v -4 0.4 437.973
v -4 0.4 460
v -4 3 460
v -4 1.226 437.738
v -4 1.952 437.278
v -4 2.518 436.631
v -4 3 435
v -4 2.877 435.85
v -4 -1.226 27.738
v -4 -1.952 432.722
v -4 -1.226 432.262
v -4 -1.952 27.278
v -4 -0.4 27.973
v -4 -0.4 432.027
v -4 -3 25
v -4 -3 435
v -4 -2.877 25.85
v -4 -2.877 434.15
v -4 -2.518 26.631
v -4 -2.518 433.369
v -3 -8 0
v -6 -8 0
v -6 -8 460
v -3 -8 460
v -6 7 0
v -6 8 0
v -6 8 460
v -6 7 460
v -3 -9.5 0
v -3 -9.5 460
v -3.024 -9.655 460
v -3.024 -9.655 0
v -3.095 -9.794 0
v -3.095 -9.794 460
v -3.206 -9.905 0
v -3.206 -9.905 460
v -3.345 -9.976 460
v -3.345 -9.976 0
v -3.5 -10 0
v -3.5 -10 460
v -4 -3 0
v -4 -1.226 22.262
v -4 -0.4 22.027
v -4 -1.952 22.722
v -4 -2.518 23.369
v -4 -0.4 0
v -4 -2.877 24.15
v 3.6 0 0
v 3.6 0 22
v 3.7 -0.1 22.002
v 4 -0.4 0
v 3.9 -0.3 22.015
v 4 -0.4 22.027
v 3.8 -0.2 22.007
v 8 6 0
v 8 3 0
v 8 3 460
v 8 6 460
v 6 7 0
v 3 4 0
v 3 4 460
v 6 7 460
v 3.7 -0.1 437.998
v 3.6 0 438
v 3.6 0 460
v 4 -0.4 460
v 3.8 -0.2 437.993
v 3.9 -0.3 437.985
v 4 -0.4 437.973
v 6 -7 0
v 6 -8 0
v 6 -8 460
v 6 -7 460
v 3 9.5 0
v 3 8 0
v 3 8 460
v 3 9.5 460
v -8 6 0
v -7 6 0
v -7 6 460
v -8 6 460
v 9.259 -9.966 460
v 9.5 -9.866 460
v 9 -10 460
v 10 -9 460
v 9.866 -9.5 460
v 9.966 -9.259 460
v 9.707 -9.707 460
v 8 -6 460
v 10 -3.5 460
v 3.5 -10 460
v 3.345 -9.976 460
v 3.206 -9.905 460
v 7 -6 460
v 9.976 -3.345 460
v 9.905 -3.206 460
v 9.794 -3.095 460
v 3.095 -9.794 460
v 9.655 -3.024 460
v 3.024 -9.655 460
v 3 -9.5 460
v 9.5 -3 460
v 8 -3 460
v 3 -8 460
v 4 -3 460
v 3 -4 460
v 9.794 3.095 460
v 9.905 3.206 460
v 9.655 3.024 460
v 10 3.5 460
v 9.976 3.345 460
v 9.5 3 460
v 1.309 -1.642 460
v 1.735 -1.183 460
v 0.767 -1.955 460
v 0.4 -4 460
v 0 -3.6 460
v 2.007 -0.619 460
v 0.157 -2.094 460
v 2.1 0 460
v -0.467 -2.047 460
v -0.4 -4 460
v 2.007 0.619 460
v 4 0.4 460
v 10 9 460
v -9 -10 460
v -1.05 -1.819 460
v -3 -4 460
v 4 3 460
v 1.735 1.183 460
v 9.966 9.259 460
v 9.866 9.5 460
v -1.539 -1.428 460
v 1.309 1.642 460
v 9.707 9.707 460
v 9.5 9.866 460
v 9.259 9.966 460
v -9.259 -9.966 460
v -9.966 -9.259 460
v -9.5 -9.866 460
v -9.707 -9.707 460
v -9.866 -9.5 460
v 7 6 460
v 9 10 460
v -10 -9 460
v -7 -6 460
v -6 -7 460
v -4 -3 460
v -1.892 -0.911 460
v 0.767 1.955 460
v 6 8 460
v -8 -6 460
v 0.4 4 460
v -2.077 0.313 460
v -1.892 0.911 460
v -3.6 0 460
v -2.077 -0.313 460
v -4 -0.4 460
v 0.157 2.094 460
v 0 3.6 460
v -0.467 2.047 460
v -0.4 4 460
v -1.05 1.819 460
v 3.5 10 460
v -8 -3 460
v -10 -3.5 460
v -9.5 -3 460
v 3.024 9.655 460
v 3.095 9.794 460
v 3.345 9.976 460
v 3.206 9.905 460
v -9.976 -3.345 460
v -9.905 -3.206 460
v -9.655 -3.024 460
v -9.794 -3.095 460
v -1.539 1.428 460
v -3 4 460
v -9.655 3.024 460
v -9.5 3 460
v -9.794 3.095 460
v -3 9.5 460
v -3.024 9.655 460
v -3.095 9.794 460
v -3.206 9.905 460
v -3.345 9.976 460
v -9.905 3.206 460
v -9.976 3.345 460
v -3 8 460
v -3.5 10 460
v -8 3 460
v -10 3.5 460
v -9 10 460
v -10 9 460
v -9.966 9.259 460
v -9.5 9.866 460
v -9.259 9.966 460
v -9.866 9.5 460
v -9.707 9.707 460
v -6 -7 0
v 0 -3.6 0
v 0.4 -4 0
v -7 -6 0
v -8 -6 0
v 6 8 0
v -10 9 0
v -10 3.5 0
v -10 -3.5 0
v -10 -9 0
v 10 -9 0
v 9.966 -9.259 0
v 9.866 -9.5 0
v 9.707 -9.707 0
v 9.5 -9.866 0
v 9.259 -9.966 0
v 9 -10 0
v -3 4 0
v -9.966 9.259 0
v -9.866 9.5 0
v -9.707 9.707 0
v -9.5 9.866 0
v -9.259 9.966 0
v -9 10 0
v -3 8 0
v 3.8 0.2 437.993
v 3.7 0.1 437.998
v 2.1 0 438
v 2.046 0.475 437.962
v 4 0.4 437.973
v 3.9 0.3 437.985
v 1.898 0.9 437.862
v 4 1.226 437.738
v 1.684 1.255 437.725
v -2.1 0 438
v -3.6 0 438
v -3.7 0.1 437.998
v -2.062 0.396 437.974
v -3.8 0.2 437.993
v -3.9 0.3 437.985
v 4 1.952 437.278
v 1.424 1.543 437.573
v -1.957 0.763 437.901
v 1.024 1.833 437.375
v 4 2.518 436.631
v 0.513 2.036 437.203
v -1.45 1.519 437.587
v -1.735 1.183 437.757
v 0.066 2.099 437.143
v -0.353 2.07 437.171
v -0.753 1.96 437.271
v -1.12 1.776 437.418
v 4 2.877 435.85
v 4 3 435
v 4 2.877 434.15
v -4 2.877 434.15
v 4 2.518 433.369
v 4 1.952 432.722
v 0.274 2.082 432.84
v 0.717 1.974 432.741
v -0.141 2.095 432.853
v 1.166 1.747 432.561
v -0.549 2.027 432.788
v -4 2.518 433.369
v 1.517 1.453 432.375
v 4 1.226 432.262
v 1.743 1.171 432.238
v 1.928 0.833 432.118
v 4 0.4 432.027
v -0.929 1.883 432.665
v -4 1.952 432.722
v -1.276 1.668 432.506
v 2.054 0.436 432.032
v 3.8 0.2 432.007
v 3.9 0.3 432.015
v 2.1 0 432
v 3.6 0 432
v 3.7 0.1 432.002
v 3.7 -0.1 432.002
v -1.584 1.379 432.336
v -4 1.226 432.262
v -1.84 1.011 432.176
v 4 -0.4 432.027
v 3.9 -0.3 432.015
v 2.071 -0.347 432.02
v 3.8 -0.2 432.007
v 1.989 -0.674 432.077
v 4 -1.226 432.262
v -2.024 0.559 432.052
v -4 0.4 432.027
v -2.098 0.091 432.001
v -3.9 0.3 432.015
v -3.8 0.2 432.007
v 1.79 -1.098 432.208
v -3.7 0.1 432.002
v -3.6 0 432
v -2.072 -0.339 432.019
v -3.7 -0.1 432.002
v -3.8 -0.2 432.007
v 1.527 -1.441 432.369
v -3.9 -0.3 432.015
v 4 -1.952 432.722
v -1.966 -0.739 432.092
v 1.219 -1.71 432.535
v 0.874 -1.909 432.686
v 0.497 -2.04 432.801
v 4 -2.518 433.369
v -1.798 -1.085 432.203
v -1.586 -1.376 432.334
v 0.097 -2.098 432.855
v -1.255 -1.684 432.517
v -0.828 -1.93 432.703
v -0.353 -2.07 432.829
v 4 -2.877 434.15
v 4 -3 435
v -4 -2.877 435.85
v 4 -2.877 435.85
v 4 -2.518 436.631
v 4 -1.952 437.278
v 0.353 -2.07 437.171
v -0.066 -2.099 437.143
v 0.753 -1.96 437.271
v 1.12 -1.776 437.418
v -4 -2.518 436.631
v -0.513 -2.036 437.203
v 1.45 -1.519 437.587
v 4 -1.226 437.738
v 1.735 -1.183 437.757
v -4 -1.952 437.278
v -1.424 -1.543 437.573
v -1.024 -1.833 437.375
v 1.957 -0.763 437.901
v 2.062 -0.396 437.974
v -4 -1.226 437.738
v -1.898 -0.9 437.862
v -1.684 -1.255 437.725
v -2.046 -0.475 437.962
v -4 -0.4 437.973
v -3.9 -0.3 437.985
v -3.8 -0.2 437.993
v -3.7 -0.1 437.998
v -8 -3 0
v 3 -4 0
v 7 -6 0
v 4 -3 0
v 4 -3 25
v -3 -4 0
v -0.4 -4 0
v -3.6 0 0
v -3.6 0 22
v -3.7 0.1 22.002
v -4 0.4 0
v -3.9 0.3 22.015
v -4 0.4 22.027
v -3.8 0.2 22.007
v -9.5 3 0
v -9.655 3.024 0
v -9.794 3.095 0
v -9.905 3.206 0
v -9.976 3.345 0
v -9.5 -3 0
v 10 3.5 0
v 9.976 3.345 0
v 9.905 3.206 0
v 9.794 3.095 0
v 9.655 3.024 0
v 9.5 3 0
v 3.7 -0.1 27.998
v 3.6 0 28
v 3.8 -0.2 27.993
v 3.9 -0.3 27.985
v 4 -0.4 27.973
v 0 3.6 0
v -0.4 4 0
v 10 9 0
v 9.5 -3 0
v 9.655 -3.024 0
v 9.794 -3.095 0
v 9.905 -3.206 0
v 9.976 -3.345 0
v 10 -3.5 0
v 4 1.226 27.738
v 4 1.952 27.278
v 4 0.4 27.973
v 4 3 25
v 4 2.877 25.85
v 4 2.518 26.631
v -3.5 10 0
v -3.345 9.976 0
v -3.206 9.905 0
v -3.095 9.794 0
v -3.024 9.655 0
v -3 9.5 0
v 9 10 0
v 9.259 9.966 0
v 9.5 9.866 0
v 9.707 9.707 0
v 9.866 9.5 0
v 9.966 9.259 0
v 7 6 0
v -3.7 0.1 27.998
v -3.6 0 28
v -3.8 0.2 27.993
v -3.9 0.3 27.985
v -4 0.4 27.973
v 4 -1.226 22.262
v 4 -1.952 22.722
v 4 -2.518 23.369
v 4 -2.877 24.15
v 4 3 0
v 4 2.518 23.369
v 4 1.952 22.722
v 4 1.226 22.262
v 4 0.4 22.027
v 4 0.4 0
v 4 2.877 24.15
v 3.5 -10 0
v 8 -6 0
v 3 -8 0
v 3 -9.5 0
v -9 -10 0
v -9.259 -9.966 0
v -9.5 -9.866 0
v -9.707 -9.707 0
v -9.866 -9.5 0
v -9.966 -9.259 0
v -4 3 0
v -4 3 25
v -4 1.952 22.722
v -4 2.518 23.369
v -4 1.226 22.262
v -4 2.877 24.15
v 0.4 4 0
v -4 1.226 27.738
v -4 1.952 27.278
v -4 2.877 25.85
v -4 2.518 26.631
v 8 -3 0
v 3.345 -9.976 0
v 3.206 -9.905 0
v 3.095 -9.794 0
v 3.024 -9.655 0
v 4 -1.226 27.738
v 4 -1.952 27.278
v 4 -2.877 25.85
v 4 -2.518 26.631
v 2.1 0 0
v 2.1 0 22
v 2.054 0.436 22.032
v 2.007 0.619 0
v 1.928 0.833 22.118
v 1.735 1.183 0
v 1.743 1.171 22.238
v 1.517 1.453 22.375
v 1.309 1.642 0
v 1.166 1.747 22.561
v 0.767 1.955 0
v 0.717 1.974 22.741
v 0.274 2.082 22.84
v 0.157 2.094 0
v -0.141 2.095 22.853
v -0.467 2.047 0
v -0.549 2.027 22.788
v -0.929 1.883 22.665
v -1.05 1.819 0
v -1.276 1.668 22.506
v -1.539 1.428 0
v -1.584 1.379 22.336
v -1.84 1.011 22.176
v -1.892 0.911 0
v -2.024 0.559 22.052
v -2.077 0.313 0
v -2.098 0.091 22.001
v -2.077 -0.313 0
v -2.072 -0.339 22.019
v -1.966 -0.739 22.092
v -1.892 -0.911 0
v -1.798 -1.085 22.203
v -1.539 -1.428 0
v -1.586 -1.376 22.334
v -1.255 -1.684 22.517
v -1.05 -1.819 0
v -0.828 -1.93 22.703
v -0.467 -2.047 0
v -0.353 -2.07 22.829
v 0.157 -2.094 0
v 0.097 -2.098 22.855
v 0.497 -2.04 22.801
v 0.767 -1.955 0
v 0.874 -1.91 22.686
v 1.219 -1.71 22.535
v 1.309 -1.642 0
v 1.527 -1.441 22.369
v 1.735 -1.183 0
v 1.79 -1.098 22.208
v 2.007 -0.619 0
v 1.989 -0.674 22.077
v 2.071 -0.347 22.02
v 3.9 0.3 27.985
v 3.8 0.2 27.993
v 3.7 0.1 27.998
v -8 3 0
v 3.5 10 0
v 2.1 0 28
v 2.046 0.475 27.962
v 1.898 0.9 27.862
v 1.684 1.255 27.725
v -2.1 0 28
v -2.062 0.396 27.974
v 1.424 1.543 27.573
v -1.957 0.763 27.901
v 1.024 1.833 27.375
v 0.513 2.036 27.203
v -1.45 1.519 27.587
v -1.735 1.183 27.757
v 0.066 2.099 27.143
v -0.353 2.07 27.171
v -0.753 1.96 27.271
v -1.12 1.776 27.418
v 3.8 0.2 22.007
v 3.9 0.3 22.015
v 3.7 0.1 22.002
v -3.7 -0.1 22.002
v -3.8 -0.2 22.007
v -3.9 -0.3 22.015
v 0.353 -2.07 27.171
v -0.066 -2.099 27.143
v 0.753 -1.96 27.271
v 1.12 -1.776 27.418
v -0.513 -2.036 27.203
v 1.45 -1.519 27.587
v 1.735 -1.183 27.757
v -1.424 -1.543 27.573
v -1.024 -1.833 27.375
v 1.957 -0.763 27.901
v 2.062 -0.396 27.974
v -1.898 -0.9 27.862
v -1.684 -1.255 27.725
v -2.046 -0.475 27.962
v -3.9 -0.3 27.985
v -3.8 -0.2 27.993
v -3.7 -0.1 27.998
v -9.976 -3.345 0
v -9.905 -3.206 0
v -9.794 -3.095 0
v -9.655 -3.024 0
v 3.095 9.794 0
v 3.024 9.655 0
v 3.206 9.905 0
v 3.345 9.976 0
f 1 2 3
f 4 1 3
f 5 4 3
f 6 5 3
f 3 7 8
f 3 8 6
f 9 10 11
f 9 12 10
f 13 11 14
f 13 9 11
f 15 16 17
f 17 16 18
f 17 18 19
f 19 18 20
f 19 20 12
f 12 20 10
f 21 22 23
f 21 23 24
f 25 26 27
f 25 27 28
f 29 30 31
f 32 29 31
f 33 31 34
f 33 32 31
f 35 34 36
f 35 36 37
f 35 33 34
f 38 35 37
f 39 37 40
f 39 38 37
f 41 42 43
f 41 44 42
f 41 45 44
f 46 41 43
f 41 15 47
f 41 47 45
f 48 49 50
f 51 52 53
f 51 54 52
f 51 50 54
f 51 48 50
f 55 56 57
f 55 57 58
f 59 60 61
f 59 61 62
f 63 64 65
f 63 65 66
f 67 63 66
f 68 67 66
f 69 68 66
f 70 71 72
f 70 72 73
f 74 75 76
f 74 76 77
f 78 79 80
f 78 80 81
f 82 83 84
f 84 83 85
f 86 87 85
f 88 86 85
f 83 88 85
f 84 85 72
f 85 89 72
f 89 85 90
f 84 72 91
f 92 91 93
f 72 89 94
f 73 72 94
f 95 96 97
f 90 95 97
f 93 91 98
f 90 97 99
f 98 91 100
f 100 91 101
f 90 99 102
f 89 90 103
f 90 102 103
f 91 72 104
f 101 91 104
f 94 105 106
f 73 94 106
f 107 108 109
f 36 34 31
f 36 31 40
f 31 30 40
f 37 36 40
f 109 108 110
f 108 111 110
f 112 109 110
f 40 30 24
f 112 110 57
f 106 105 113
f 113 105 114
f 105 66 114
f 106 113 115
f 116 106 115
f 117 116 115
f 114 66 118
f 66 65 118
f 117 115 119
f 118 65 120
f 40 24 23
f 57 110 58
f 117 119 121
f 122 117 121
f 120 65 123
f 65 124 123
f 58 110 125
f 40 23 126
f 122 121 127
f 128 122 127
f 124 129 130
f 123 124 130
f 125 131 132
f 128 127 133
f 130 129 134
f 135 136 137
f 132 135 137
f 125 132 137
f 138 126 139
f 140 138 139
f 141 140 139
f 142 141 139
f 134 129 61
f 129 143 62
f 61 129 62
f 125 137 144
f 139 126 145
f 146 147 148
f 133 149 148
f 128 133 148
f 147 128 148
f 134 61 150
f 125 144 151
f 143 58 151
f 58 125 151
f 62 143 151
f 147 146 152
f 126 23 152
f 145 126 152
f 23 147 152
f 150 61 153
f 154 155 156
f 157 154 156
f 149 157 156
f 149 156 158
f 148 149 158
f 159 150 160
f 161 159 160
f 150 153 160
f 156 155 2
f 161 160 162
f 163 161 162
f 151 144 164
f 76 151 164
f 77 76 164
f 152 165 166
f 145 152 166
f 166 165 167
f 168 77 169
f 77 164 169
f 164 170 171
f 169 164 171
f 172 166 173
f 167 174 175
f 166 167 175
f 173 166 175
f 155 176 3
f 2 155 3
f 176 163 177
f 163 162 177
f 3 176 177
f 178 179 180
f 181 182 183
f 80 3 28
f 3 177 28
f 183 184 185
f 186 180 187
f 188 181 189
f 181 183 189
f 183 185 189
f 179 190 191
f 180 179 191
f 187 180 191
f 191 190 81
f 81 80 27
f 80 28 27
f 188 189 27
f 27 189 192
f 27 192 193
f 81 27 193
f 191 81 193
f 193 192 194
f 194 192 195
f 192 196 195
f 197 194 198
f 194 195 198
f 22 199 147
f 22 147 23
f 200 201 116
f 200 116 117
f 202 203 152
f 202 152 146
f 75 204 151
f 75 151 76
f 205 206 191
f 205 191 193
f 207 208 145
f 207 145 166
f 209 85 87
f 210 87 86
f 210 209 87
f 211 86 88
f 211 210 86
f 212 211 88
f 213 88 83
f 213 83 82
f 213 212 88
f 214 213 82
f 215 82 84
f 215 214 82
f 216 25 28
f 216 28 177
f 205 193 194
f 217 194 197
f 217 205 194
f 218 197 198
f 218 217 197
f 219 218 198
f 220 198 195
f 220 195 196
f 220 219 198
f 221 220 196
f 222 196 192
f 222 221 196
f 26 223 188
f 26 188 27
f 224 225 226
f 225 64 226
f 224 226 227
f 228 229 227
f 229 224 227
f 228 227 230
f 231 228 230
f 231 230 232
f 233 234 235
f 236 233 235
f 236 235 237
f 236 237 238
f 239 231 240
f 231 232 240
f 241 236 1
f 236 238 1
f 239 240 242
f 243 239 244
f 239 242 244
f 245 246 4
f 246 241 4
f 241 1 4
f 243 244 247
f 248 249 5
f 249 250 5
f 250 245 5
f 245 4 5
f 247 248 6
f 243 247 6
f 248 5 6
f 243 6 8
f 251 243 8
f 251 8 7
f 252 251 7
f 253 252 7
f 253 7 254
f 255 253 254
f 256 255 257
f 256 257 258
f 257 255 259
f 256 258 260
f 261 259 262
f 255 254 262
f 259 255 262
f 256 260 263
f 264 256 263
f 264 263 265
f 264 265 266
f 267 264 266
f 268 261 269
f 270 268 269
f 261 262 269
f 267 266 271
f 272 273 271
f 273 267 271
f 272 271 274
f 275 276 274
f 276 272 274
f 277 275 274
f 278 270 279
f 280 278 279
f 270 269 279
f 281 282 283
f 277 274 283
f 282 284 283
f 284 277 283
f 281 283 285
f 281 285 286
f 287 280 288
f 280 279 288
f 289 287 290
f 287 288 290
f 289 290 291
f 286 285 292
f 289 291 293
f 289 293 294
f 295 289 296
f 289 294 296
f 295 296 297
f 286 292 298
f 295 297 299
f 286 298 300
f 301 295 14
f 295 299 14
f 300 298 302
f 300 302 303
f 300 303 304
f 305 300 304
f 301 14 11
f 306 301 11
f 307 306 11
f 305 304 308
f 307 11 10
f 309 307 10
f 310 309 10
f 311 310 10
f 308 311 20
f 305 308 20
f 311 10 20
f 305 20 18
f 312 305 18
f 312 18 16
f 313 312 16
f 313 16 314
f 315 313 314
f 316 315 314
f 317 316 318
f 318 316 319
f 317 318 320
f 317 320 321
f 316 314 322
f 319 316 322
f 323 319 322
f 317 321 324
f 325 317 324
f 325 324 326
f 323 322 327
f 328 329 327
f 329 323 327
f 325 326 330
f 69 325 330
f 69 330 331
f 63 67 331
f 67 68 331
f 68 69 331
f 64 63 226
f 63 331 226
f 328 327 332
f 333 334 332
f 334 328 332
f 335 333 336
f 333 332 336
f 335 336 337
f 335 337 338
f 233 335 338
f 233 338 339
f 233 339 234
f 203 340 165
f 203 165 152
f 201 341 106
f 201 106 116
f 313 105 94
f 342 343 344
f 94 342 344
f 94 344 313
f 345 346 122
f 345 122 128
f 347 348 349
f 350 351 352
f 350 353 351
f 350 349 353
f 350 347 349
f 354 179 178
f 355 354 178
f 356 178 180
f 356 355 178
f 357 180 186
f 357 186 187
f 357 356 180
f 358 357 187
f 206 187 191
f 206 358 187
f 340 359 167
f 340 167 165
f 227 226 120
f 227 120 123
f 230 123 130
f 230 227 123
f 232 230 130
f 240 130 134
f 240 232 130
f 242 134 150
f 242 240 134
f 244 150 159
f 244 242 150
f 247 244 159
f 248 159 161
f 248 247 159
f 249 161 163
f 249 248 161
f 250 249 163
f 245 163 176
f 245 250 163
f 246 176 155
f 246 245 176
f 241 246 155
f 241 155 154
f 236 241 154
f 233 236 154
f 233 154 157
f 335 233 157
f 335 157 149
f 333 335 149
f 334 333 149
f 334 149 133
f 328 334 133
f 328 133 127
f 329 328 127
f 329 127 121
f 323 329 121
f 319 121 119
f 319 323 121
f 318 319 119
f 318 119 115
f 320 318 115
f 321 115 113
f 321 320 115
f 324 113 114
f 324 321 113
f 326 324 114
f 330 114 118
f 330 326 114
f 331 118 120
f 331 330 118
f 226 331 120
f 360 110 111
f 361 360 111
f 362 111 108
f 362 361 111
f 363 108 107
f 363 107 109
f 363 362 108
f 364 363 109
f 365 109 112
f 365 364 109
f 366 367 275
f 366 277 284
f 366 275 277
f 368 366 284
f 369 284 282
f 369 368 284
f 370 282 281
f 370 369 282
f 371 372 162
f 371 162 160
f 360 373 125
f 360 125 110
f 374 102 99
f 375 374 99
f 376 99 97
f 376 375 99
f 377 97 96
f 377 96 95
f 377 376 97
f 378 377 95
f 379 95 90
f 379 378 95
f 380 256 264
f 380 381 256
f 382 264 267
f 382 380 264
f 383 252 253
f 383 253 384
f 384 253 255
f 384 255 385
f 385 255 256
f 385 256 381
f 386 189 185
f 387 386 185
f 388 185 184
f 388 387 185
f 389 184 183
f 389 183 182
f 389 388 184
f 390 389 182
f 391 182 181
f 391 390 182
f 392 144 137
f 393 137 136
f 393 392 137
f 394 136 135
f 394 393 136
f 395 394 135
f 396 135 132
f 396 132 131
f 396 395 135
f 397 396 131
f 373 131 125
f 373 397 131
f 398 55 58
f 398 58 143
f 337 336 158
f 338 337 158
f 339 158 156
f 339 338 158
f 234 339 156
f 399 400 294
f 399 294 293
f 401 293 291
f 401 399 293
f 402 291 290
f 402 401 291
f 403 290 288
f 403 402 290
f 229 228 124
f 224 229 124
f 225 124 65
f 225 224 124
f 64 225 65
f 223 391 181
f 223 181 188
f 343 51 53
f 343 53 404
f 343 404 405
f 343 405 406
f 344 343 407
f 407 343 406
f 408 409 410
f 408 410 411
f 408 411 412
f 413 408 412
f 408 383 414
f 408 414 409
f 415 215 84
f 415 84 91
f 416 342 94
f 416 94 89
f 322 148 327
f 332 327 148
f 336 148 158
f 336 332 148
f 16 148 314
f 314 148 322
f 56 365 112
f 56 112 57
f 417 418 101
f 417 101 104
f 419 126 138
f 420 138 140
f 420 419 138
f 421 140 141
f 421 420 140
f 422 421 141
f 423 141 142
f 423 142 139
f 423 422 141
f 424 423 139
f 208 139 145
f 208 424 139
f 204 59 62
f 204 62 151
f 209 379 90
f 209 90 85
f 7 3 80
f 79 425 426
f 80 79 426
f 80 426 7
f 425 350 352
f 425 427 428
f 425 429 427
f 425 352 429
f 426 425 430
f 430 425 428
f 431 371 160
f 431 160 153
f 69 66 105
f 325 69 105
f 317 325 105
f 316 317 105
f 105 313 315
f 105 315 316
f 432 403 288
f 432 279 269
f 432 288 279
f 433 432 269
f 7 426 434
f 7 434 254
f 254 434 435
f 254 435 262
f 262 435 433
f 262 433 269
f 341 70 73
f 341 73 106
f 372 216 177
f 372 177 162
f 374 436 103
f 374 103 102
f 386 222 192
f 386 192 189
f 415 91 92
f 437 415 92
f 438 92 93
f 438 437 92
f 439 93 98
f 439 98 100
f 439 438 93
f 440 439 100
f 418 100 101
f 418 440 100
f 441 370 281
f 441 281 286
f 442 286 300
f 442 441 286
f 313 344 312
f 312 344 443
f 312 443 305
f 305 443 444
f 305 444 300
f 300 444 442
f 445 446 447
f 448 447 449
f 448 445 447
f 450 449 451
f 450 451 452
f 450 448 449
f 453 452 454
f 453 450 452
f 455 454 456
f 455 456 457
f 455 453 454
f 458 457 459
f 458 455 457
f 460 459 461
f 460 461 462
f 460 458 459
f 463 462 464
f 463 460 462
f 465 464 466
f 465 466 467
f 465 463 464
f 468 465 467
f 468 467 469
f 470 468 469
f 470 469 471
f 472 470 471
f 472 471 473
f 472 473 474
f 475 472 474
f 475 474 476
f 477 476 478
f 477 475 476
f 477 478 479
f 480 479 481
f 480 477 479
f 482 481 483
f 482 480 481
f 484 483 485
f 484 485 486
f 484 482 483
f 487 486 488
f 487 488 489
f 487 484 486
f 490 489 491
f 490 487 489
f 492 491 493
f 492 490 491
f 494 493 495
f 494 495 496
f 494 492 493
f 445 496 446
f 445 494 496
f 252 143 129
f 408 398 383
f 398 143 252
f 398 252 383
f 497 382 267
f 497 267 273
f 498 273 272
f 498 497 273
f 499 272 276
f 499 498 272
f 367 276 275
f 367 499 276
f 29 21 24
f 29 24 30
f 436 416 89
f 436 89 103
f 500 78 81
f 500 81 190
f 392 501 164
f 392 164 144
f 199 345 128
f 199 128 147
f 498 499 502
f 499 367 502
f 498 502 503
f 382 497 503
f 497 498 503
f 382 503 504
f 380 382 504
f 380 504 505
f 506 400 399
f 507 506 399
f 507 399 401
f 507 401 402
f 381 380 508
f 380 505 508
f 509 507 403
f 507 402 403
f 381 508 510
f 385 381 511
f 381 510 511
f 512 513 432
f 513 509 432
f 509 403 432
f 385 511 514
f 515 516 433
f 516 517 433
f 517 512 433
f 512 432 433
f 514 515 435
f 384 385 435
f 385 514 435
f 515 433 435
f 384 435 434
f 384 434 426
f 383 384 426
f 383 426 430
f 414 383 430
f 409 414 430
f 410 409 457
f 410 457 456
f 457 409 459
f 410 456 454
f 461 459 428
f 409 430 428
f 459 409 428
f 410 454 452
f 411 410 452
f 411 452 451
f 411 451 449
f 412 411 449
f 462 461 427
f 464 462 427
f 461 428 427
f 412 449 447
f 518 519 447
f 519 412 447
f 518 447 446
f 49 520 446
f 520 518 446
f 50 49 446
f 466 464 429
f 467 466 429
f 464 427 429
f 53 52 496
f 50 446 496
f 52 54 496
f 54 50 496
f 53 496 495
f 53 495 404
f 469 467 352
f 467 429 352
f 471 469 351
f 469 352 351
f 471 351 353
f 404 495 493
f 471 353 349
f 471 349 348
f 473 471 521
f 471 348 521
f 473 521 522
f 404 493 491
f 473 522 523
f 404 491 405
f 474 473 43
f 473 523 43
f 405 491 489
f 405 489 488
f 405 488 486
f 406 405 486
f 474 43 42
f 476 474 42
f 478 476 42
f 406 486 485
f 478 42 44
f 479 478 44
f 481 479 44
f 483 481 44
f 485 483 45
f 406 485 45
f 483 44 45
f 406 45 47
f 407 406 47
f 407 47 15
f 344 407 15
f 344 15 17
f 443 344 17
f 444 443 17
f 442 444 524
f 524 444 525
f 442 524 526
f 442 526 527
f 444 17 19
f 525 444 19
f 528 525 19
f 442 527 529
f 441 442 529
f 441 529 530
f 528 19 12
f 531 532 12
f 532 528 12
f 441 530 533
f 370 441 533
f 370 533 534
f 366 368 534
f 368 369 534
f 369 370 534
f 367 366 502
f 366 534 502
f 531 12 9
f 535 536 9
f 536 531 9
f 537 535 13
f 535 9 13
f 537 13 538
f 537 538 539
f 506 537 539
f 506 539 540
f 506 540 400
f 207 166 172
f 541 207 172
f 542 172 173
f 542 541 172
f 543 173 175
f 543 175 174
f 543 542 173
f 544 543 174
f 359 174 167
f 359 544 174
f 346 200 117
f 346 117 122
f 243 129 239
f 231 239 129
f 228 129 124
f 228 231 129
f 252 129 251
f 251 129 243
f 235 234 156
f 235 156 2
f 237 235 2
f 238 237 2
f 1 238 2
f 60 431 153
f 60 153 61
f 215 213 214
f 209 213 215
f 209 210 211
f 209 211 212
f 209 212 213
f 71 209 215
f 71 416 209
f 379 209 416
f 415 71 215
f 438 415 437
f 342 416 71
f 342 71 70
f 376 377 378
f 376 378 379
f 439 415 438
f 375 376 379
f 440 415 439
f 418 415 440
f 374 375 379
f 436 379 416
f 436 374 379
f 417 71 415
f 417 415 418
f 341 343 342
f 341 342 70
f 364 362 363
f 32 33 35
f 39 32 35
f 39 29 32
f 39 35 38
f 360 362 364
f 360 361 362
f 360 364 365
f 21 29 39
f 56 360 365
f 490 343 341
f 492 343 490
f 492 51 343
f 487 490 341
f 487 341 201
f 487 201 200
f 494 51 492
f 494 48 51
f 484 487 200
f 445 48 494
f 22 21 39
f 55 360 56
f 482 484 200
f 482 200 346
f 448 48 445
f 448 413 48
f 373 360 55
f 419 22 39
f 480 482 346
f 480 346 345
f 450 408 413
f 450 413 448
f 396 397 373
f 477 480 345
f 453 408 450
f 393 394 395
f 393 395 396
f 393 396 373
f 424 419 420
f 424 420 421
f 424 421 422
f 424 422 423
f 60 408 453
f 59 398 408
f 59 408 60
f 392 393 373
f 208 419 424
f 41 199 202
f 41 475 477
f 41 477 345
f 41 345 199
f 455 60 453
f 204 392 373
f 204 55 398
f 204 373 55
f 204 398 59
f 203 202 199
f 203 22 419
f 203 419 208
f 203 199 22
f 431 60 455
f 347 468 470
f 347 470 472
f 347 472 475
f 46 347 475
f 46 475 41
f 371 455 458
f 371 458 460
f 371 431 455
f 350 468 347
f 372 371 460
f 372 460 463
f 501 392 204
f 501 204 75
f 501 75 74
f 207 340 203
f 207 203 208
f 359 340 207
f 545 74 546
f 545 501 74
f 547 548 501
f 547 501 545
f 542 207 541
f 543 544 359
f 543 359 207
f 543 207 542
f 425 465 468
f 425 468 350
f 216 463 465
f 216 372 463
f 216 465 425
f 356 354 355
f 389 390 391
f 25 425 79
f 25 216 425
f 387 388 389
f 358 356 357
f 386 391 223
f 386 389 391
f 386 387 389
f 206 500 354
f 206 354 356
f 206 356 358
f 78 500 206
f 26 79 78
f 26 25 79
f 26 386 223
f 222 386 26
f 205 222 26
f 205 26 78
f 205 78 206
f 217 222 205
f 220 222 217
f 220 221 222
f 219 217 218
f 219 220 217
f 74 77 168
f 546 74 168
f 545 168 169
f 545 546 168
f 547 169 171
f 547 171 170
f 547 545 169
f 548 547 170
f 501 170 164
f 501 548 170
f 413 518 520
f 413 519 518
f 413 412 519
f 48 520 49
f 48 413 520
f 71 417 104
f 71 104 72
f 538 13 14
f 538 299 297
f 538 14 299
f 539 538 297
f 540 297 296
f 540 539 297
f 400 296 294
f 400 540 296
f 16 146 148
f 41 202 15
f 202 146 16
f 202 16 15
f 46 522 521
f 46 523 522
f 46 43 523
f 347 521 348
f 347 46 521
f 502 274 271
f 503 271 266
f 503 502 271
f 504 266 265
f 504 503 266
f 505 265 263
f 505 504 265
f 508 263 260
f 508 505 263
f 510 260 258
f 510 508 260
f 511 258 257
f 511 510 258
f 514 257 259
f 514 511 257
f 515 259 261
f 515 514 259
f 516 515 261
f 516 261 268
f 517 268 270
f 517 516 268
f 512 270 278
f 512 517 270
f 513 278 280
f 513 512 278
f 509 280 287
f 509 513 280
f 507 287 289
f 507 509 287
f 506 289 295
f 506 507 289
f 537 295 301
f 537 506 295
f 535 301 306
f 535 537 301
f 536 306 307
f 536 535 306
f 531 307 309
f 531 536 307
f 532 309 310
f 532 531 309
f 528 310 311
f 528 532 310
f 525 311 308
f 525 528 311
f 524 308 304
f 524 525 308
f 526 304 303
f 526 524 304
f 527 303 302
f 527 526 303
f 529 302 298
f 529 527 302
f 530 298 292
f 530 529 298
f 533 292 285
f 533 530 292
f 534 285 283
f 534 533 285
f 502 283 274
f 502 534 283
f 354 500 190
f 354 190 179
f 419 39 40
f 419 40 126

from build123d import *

# Parameters (mm, degrees)
SCHIZZO1_R                   = 2.1
ESTRUSIONE_ESTRUSIONE1_DEPTH = 460
SCHIZZO2_R                   = 3
TAGLIO_ESTRUSIONE1_DEPTH     = 15


with BuildPart() as part:
    # Schizzo1 → Estrusione-Estrusione1 (new body)
    with BuildSketch(Plane.XY):
        with BuildLine():
            Line((-3.6, 0), (-4, 0.4))
            Line((-4, 0.4), (-4, 3))
            Line((-4, 3), (-7, 6))
            Line((-7, 6), (-8, 6))
            Line((-8, 6), (-8, 3))
            Line((-8, 3), (-9.5, 3))
            ThreePointArc((-9.5, 3), (-9.853553391, 3.146446609), (-10, 3.5))
            Line((-10, 3.5), (-10, 9))
            ThreePointArc((-10, 9), (-9.707106781, 9.707106781), (-9, 10))
            Line((-9, 10), (-3.5, 10))
            ThreePointArc((-3.5, 10), (-3.146446609, 9.853553391), (-3, 9.5))
            Line((-3, 9.5), (-3, 8))
            Line((-3, 8), (-6, 8))
            Line((-6, 8), (-6, 7))
            Line((-6, 7), (-3, 4))
            Line((-3, 4), (-0.4, 4))
            Line((-0.4, 4), (0, 3.6))
            Line((0, 3.6), (0.4, 4))
            Line((0.4, 4), (3, 4))
            Line((3, 4), (6, 7))
            Line((6, 7), (6, 8))
            Line((6, 8), (3, 8))
            Line((3, 8), (3, 9.5))
            ThreePointArc((3, 9.5), (3.146446609, 9.853553391), (3.5, 10))
            Line((3.5, 10), (9, 10))
            ThreePointArc((9, 10), (9.707106781, 9.707106781), (10, 9))
            Line((10, 9), (10, 3.5))
            ThreePointArc((10, 3.5), (9.853553391, 3.146446609), (9.5, 3))
            Line((9.5, 3), (8, 3))
            Line((8, 3), (8, 6))
            Line((8, 6), (7, 6))
            Line((7, 6), (4, 3))
            Line((4, 3), (4, 0.4))
            Line((4, 0.4), (3.6, 0))
            Line((3.6, 0), (4, -0.4))
            Line((4, -0.4), (4, -3))
            Line((4, -3), (7, -6))
            Line((7, -6), (8, -6))
            Line((8, -6), (8, -3))
            Line((8, -3), (9.5, -3))
            ThreePointArc((9.5, -3), (9.853553391, -3.146446609), (10, -3.5))
            Line((10, -3.5), (10, -9))
            ThreePointArc((10, -9), (9.707106781, -9.707106781), (9, -10))
            Line((9, -10), (3.5, -10))
            ThreePointArc((3.5, -10), (3.146446609, -9.853553391), (3, -9.5))
            Line((3, -9.5), (3, -8))
            Line((3, -8), (6, -8))
            Line((6, -8), (6, -7))
            Line((6, -7), (3, -4))
            Line((3, -4), (0.4, -4))
            Line((0.4, -4), (0, -3.6))
            Line((0, -3.6), (-0.4, -4))
            Line((-0.4, -4), (-3, -4))
            Line((-3, -4), (-6, -7))
            Line((-6, -7), (-6, -8))
            Line((-6, -8), (-3, -8))
            Line((-3, -8), (-3, -9.5))
            ThreePointArc((-3, -9.5), (-3.146446609, -9.853553391), (-3.5, -10))
            Line((-3.5, -10), (-9, -10))
            ThreePointArc((-9, -10), (-9.707106781, -9.707106781), (-10, -9))
            Line((-10, -9), (-10, -3.5))
            ThreePointArc((-10, -3.5), (-9.853553391, -3.146446609), (-9.5, -3))
            Line((-9.5, -3), (-8, -3))
            Line((-8, -3), (-8, -6))
            Line((-8, -6), (-7, -6))
            Line((-7, -6), (-4, -3))
            Line((-4, -3), (-4, -0.4))
            Line((-4, -0.4), (-3.6, 0))
        make_face()
        Circle(SCHIZZO1_R, mode=Mode.SUBTRACT)
    extrude(amount=ESTRUSIONE_ESTRUSIONE1_DEPTH)

    # Schizzo2 → Taglio-Estrusione1 (cut, through all)
    with BuildSketch(Plane.ZY.offset(4)):
        with Locations((25, 0)):
            Circle(SCHIZZO2_R)
        with Locations((435, 0)):
            Circle(SCHIZZO2_R)
    extrude(amount=-TAGLIO_ESTRUSIONE1_DEPTH, mode=Mode.SUBTRACT)


solid = part.part
